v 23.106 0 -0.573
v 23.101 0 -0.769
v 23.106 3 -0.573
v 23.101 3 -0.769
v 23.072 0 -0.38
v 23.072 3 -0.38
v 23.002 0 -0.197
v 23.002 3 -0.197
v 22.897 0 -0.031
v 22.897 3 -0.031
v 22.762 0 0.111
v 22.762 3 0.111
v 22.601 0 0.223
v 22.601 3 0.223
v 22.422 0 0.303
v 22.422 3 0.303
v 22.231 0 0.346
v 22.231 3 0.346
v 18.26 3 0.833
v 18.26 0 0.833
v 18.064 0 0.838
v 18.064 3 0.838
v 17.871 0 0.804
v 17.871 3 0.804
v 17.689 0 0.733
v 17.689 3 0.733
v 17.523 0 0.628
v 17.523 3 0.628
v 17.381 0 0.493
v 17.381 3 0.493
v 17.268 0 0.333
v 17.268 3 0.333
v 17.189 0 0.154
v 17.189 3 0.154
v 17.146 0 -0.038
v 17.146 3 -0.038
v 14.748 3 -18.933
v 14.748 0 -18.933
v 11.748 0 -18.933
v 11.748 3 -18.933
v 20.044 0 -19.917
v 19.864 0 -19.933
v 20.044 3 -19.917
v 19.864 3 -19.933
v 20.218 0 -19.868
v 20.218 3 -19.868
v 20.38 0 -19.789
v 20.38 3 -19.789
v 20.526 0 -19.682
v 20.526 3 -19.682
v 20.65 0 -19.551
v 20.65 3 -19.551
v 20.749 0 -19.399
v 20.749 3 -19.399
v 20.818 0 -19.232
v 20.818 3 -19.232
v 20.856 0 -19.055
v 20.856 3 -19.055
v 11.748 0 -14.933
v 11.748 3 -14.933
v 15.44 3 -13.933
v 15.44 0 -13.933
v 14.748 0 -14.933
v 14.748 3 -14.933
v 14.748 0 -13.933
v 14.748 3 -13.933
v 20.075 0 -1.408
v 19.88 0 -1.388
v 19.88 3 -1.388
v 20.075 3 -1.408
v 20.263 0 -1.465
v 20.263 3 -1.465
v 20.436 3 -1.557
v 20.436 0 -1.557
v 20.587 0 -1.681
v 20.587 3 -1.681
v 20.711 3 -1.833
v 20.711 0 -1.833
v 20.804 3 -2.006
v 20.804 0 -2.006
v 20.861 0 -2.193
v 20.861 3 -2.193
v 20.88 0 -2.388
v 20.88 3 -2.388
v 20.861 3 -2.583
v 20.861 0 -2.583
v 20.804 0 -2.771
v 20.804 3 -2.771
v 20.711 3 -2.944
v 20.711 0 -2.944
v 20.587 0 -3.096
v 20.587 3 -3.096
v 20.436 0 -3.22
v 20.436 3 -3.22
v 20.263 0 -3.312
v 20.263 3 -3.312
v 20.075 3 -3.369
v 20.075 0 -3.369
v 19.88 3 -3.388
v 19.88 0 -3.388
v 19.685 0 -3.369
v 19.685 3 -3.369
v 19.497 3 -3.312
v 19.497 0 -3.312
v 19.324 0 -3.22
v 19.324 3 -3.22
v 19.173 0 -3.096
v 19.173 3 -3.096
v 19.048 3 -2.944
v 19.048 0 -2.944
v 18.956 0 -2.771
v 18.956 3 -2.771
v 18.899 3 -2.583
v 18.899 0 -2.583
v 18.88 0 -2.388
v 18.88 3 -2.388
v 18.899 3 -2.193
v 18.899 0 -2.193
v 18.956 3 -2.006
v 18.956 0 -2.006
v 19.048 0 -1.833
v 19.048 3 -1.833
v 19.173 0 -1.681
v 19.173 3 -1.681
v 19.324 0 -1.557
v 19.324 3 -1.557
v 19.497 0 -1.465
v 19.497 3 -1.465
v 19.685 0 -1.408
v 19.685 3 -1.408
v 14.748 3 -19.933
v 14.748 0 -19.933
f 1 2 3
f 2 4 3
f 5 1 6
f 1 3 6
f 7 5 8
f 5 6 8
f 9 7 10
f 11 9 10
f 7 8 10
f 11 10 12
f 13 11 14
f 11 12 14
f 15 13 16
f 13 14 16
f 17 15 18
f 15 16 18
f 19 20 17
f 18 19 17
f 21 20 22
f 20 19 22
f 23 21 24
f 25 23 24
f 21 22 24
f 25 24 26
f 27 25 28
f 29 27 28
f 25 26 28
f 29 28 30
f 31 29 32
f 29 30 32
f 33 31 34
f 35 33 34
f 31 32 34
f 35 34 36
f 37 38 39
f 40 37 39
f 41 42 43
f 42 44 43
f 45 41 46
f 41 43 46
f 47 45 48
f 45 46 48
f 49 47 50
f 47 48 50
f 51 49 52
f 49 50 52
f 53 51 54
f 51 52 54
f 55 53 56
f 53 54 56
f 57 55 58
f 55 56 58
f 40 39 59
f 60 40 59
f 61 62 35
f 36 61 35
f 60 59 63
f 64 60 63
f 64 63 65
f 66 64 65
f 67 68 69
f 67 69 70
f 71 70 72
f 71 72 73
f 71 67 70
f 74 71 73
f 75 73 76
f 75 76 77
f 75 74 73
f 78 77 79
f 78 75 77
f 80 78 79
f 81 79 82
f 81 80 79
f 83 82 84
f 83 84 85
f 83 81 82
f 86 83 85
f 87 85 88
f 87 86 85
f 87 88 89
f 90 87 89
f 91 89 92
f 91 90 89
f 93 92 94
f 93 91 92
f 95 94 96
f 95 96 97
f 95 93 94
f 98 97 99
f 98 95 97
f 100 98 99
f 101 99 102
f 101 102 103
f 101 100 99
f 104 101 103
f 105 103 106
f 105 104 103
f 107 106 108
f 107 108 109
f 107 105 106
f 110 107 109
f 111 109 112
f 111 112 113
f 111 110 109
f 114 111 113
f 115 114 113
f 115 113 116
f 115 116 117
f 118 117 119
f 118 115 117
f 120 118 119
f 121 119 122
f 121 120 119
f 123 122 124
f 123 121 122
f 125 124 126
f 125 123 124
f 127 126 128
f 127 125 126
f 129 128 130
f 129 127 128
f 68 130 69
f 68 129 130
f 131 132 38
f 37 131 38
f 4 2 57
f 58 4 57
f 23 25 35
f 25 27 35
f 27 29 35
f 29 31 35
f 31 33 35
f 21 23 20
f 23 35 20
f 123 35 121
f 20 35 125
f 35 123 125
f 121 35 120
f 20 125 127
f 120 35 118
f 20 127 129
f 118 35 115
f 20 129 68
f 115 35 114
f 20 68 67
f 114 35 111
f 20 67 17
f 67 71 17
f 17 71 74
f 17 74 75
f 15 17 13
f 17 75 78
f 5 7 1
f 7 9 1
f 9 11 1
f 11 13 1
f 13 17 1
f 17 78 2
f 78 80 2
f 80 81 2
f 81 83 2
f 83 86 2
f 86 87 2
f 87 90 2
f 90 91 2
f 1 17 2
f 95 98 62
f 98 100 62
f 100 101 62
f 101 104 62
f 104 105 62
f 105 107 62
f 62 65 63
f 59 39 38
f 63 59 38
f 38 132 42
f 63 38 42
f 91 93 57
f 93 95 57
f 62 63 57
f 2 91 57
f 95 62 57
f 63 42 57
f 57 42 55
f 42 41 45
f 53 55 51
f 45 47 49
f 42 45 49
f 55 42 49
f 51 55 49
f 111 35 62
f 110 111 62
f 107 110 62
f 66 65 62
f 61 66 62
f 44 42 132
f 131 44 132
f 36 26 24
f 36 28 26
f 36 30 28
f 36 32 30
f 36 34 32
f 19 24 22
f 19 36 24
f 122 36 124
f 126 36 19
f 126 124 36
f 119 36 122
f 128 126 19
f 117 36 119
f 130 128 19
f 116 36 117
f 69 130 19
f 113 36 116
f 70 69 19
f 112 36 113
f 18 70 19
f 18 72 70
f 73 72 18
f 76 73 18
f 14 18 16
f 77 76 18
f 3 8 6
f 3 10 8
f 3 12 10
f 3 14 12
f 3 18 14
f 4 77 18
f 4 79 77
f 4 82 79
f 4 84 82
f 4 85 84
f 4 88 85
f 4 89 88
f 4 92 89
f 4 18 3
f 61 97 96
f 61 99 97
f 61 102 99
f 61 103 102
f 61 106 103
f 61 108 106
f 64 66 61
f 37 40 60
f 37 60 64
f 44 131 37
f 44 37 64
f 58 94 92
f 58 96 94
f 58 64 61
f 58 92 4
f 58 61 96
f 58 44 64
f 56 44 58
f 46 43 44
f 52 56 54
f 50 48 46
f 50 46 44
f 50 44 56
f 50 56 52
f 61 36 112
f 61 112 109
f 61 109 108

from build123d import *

# Parameters (mm, degrees)
SKETCH2_R           = 1
BOSS_EXTRUDE1_DEPTH = 3
FILLET1_R           = 1


with BuildPart() as part:
    # Sketch2 → Boss-Extrude1 (new body)
    with BuildSketch(Plane(origin=(0, 0, 0), x_dir=(1, 0, 0), z_dir=(0, 1, 0))):
        Polygon((20.748238747, 19.933341623), (14.748238747, 19.933341623), (14.748238747, 18.933341623), (11.748238747, 18.933341623), (11.748238747, 14.933341623), (14.748238747, 14.933341623), (14.748238747, 13.933341623), (15.43988716, 13.933341623), (17.267927311, -0.954850651), (23.22320422, -0.223634591), align=None)
        with Locations(Location((19.879957735, 2.388395834, 0), (0, 0, 270))):
            Circle(SKETCH2_R, mode=Mode.SUBTRACT)
    extrude(amount=BOSS_EXTRUDE1_DEPTH)

    # Fillet1
    fillet1_edges = [part.edges().sort_by_distance(p)[0] for p in [
        (20.748238747, 1.5, -19.933341623),
        (23.22320422, 1.5, 0.223634591),
        (17.267927311, 1.5, 0.954850651),
    ]]
    fillet(fillet1_edges, radius=FILLET1_R)


solid = part.part
